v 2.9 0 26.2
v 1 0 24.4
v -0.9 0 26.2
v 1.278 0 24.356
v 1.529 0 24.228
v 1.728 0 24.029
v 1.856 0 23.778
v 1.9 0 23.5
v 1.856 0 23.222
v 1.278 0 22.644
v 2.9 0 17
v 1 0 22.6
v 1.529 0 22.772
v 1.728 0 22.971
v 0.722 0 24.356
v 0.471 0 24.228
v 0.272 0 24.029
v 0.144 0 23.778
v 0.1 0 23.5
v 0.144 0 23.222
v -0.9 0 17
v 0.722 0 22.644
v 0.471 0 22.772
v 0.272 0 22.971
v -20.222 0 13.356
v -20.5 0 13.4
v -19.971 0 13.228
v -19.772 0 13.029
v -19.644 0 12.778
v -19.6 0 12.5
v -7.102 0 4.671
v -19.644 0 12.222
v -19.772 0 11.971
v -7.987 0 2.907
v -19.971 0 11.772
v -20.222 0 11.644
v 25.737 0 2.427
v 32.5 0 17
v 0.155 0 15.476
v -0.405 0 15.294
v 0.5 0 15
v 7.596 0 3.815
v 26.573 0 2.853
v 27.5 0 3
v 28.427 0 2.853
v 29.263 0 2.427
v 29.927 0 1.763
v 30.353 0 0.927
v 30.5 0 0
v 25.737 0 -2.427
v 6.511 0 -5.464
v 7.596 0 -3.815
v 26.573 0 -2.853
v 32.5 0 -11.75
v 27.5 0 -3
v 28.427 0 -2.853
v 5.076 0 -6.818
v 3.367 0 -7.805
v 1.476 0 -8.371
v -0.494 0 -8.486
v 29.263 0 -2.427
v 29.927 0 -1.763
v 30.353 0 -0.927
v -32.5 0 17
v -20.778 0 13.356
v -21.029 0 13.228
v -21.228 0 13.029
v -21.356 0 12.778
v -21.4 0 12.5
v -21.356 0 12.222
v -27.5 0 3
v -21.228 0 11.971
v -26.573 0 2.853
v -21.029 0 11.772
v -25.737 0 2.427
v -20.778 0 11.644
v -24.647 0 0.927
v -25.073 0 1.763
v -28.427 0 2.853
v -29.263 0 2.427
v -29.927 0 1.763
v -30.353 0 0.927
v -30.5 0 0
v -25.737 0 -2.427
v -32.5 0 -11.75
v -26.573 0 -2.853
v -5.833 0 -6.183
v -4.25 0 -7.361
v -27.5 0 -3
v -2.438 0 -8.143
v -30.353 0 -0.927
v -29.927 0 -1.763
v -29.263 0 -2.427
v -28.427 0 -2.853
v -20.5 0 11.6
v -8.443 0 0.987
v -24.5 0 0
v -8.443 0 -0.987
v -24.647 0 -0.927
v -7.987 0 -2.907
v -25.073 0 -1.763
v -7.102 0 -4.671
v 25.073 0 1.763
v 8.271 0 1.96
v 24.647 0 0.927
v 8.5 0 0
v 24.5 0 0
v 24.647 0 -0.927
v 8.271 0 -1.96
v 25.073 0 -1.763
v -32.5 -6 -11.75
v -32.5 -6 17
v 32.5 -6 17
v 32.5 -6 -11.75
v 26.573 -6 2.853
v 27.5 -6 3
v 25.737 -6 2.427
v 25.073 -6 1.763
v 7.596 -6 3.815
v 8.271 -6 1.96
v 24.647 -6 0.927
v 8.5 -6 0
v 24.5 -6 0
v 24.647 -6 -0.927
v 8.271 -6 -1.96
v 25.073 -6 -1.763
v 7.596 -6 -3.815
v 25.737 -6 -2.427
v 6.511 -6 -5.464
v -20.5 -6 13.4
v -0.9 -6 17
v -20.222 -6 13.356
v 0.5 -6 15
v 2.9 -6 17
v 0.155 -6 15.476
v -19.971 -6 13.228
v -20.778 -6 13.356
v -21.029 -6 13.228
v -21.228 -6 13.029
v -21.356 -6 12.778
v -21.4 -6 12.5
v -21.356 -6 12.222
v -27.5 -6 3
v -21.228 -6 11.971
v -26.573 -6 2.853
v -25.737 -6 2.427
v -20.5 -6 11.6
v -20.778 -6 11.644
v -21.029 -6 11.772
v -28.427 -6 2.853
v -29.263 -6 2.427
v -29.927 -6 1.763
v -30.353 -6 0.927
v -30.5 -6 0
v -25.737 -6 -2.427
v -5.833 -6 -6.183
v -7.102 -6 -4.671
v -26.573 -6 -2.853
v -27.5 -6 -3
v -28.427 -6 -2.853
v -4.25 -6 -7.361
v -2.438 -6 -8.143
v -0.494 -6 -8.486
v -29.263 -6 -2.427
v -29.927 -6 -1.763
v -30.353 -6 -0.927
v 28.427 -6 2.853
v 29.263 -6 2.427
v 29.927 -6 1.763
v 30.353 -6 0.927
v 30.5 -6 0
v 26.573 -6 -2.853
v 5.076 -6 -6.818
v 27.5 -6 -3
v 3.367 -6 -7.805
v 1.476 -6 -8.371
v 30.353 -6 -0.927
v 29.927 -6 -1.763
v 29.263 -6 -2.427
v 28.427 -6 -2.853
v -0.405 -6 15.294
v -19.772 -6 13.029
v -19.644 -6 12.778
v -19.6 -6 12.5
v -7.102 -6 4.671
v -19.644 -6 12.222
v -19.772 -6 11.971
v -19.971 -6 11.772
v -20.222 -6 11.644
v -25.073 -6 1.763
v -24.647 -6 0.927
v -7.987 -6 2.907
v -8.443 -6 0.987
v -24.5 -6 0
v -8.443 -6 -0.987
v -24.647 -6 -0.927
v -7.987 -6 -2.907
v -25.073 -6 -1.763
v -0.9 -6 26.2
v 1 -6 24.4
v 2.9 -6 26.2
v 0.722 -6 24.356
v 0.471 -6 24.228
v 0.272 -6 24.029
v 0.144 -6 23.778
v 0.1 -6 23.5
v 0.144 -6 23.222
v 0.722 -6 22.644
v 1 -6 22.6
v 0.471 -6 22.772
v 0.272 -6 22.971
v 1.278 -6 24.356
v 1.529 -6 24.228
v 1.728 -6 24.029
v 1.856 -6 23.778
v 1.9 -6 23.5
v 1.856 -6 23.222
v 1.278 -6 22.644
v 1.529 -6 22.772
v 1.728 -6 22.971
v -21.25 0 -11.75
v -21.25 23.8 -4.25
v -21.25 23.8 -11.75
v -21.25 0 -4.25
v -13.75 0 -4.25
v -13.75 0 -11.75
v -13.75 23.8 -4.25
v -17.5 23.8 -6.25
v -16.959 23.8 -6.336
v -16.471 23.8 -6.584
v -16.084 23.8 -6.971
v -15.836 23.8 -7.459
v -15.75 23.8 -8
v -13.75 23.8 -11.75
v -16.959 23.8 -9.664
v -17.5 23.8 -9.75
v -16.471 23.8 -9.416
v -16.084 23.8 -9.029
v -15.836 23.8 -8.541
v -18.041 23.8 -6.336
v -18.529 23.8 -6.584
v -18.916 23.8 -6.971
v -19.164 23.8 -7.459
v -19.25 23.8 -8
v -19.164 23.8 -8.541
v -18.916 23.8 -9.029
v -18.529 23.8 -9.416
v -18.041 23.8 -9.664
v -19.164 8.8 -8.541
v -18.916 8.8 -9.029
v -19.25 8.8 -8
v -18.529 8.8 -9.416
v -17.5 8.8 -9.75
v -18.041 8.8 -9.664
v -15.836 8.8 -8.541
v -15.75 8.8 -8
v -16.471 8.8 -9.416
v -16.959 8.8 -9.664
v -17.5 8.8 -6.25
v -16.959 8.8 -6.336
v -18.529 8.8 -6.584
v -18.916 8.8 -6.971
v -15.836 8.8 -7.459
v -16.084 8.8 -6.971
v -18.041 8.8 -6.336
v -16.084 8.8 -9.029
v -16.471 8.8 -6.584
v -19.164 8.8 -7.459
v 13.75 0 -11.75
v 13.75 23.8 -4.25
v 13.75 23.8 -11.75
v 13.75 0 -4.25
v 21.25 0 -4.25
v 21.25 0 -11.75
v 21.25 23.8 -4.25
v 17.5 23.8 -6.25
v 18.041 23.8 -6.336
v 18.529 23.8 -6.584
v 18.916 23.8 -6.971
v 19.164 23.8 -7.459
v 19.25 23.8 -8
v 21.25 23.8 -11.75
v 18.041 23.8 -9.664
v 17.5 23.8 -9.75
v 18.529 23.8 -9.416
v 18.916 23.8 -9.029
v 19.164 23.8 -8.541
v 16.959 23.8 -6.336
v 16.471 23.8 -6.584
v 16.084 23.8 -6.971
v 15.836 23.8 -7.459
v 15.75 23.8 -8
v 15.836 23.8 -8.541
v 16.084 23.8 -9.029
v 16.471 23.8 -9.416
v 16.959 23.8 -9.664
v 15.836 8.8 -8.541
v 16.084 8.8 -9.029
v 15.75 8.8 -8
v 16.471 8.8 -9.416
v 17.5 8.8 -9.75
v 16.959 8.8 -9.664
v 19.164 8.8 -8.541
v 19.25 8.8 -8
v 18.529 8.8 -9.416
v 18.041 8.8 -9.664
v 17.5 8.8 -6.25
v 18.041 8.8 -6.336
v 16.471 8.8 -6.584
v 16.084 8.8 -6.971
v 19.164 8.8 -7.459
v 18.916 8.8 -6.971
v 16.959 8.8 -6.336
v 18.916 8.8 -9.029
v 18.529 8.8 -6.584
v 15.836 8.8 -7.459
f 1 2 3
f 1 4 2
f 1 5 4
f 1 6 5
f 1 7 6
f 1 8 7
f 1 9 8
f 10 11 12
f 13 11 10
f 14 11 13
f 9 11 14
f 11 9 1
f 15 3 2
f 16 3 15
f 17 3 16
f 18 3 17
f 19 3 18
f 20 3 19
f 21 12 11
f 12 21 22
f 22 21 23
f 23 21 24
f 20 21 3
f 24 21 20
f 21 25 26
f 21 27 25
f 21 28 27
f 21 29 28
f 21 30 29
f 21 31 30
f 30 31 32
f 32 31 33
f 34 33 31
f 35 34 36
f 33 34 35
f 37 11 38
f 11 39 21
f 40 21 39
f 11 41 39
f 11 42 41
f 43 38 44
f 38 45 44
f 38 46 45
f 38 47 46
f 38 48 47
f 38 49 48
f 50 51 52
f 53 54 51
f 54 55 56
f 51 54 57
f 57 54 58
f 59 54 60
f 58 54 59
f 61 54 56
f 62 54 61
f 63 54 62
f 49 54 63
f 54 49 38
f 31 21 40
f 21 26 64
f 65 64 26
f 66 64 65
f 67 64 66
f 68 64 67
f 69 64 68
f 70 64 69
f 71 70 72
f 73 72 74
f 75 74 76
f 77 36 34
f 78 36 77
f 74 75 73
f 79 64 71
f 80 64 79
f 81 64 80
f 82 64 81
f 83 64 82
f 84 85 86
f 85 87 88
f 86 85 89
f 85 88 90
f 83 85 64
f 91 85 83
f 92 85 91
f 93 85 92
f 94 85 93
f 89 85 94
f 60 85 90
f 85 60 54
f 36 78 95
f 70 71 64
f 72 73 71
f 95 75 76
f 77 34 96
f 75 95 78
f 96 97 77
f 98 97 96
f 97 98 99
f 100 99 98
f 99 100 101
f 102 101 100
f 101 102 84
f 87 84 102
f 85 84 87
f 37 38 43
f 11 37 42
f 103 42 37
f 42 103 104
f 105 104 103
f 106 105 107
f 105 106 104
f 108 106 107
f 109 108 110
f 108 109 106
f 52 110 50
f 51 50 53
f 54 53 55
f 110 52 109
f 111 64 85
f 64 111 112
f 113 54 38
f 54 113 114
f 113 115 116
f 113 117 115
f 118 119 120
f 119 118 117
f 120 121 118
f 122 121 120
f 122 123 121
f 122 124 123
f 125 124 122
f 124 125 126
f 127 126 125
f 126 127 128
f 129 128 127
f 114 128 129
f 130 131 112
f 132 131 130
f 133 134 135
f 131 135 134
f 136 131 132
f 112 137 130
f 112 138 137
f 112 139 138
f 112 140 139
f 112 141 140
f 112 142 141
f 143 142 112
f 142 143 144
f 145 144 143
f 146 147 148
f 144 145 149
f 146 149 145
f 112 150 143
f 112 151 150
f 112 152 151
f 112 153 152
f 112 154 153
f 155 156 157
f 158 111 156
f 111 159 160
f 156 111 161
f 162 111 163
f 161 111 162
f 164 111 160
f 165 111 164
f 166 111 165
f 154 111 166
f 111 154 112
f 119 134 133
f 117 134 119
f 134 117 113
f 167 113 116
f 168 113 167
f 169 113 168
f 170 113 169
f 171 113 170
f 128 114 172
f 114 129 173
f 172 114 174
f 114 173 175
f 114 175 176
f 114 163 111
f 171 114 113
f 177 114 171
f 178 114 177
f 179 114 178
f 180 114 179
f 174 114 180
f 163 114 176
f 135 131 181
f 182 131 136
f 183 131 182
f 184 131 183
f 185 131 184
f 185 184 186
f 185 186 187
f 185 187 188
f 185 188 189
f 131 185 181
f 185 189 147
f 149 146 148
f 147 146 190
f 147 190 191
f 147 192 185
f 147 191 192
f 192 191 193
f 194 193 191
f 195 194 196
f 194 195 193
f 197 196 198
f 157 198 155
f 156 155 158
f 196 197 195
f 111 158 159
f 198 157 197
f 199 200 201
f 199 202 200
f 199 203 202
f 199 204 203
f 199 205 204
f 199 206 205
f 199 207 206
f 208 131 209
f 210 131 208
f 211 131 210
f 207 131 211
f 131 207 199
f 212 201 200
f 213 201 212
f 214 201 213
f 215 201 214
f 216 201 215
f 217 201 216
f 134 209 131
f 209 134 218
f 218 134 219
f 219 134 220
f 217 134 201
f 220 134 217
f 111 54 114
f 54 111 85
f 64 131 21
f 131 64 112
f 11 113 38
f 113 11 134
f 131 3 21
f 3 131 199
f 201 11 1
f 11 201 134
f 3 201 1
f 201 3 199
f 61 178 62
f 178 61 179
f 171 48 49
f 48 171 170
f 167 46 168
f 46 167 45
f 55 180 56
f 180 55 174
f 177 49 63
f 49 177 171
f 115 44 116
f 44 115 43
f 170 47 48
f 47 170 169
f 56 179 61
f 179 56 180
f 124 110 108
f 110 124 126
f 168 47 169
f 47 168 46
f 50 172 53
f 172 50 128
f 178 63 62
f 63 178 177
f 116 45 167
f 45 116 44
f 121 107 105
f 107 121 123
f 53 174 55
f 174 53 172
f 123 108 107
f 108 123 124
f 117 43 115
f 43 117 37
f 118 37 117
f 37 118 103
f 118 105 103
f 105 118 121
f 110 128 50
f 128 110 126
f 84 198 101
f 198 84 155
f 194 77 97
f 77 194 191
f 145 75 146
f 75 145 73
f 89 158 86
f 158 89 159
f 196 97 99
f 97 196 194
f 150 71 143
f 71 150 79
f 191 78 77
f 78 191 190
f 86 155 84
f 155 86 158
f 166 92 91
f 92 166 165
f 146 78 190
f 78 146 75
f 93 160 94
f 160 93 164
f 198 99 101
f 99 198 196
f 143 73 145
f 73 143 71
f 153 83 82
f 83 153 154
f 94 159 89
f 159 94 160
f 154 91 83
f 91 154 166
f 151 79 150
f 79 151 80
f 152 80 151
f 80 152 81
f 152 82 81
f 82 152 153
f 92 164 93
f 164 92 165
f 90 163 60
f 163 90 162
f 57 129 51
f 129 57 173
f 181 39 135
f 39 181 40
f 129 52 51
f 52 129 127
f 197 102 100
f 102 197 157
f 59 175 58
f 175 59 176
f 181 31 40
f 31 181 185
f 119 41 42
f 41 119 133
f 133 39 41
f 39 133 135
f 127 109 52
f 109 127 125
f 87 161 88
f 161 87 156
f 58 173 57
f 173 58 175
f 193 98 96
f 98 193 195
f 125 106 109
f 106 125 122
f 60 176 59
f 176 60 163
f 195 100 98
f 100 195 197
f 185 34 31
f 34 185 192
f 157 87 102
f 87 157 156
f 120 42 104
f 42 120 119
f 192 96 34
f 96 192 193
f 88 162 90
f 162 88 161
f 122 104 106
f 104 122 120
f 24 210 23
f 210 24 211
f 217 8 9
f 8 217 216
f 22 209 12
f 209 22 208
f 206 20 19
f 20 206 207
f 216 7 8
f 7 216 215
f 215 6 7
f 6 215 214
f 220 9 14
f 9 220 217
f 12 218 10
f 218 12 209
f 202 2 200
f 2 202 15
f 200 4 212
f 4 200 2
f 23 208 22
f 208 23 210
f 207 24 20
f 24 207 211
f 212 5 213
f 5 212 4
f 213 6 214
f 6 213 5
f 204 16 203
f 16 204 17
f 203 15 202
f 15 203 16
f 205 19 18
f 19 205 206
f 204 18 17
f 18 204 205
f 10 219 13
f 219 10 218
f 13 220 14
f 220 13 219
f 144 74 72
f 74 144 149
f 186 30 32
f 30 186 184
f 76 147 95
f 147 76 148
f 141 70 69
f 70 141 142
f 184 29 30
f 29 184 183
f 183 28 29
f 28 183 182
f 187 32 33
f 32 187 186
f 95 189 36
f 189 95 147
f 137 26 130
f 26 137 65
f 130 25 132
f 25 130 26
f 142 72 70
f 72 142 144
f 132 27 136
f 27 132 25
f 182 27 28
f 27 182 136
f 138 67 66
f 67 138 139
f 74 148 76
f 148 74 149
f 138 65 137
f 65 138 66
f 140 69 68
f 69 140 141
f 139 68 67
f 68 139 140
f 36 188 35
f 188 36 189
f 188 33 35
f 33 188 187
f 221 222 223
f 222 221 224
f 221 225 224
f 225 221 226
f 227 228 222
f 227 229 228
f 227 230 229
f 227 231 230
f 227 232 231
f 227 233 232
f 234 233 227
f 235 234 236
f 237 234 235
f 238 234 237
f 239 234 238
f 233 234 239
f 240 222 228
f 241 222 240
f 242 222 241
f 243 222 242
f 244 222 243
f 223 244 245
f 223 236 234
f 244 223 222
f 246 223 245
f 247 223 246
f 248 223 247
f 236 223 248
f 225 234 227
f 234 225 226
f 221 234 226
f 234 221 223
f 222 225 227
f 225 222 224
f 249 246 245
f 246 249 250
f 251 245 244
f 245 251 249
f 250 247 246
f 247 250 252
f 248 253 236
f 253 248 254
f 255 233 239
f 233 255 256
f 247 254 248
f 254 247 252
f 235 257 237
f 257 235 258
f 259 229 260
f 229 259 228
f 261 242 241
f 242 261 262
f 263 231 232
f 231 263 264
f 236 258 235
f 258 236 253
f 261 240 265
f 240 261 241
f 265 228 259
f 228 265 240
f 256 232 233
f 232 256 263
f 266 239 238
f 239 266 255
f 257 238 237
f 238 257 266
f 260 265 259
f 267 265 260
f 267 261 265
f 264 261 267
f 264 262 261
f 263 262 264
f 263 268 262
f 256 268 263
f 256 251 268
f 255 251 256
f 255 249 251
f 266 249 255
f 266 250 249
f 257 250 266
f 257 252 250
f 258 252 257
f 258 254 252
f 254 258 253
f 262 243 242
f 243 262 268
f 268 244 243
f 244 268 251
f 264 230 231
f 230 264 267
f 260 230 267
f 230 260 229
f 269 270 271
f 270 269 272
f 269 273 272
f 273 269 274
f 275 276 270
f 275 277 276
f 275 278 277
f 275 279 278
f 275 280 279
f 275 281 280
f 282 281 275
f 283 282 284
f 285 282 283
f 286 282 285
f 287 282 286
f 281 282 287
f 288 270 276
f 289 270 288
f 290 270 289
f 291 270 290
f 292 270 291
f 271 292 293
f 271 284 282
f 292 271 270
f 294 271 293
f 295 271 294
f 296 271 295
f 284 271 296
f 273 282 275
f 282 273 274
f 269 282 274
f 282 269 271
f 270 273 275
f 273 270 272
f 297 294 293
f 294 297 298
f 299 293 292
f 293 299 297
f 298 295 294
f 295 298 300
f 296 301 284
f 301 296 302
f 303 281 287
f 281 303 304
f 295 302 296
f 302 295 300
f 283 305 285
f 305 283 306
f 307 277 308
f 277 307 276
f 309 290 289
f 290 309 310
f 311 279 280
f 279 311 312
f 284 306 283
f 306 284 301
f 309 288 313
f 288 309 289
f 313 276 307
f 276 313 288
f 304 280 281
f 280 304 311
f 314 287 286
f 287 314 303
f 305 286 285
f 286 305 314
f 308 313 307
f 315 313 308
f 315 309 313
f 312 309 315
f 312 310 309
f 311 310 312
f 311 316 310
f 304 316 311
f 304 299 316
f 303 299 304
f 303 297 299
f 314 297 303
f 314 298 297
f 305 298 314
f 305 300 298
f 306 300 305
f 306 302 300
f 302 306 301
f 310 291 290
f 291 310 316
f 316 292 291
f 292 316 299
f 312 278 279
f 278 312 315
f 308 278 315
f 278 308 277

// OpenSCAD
wall_thickness=2;
// Piece that will be rotated
damper_arm_diameter=9;
damper_arm_cut_width=5.1;
damper_arm_depth=12;
// stepper mount
stepper_shaft_diameter=5.8;
stepper_shaft_cut_width=3.5;
stepper_shaft_depth=7;
// Marker for closed position
marker_size=2;
marker_distance=9;
marker_height=5;
// Connecting the two
mount_length=1.2*(damper_arm_depth+stepper_shaft_depth);
mount_diameter=max(damper_arm_diameter,stepper_shaft_diameter)+wall_thickness*2;
// Pin offset degrees to achieve fully closed vent on button press
pin_degrees_offset=0;

/* 
 * motor-to-damper adaptor
**/
//translate([0, mount_diameter, -mount_length]) motor_to_damper_adaptor();

module motor_to_damper_adaptor() {
    rotate([0,0,pin_degrees_offset]) button_pin();
    difference() {
        // main body
        cylinder(mount_length, mount_diameter/2, mount_diameter/2);
        // Stepper cutout
        translate([0,0,stepper_shaft_depth/2]) mount_cutout(stepper_shaft_diameter/2, stepper_shaft_cut_width, stepper_shaft_depth);
        // Damper cutout
        translate([0,0,mount_length-damper_arm_depth/2]) mount_cutout(damper_arm_diameter/2, damper_arm_cut_width, damper_arm_depth);
    }
    
}

module button_pin() {
    translate([mount_diameter/2,0,mount_length-marker_distance]) scale([2*marker_size/marker_height, 0.6, 1]) sphere(d=marker_height, $fn=50);
    //translate([-mount_diameter/2,0,mount_length-marker_distance]) scale([2*marker_size/marker_height, 0.6, 1]) sphere(d=marker_height, $fn=50);
}

// Motor mount
vent_type="square"; // round or square
vent_diameter = 6*25.4; // 6"
shaft_offset=8;
motor_ears_distance=35;
motot_ears_hole_diameter=3.5;
motor_ears_screw_length=15;
vent_mount_distance=55;
vent_mount_hole_diameter=6;
motor_to_vent_distance=mount_length+4-wall_thickness*1.5; // 4mm distance between connector and motor body
vent_ears_total_length=vent_mount_distance+vent_mount_hole_diameter+wall_thickness*2;
vent_ears_total_width=mount_diameter+wall_thickness*4;
motor_screw_cube_side=motot_ears_hole_diameter+wall_thickness*2;
/*
 * mount bracket itself
**/
rotate([90,180,0]) motor_to_vent_mount();

// endstop sensor
endstop_screw_diameter=1.8;
endstop_screw1_distance=17;
endstop_screw1_offset=-1;
endstop_screw2_distance=6;
endstop_screw2_offset=20.5;

// Control board
board_width=23.5;
board_length=37.5;
board_latch_height=3.5;
holder_offset=3;

// Not a good idea after all
//translate([motor_ears_distance/2+motor_screw_cube_side/2,shaft_offset+motor_screw_cube_side/2,wall_thickness]) rotate([90,90,0]) controller_mount();

module controller_mount() {
    difference(){
        cube([board_width+wall_thickness*2, board_length+wall_thickness*2, board_latch_height+wall_thickness]);
        translate([wall_thickness, wall_thickness, wall_thickness]) cube([board_width, board_length, board_latch_height]);
        // Cutout for holder to be more flexible
        translate([holder_offset,0,wall_thickness]) cube([wall_thickness,board_length+wall_thickness*2, board_latch_height]);
        translate([holder_offset+wall_thickness*2,0,wall_thickness]) cube([wall_thickness,board_length+wall_thickness*2, board_latch_height]);
        translate([board_width-holder_offset+wall_thickness,0,wall_thickness]) cube([wall_thickness,board_length+wall_thickness*2, board_latch_height]);
        translate([board_width-holder_offset-wall_thickness,0,wall_thickness]) cube([wall_thickness,board_length+wall_thickness*2, board_latch_height]);
    }
    // board holder
    //translate([wall_thickness+holder_offset,wall_thickness,board_latch_height+wall_thickness]) rotate([0,0,270]) board_holder();
    //translate([board_width-holder_offset,wall_thickness,board_latch_height+wall_thickness]) rotate([0,0,270]) board_holder();
    //translate([2*wall_thickness+holder_offset,board_length+wall_thickness,board_latch_height+wall_thickness]) rotate([0,0,90]) board_holder();
    //translate([wall_thickness+board_width-holder_offset,board_length+wall_thickness,board_latch_height+wall_thickness]) rotate([0,0,90]) board_holder();
}

module board_holder() {
    union() {
        cube(wall_thickness, wall_thickness, wall_thickness);
        translate([0,wall_thickness, wall_thickness/2])rotate([90,0,0]) cylinder(d=wall_thickness, h=wall_thickness, $fn=20);
    }
}


module motor_to_vent_mount() {
    union() {
        // Vent ears
        vent_mount_plate();
        // motor mount
        translate([motor_ears_distance/2,shaft_offset,-motor_to_vent_distance]) motor_screw_connector();
        translate([-motor_ears_distance/2,shaft_offset,-motor_to_vent_distance]) motor_screw_connector();
    }
}

module damper_mount_cutout() {
    intersection() {
        cylinder(damper_arm_depth, damper_arm_diameter, damper_arm_diameter, center=true, $fn=40);
        cube([damper_arm_diameter*2, damper_arm_cut_width, damper_arm_depth], center=true);
    }
}

module mount_cutout(radius, width, depth) {
    intersection() {
        cylinder(depth, radius, radius, center=true, $fn=40);
        cube([radius*2, width, depth], center=true);
    }
}

module vent(length) {
    if (vent_type=="round") {
        cylinder(length, vent_diameter/2, vent_diameter/2, $fn=100);
    } else if (vent_type=="square") {
    } else {
        // How do you make it visible?
        echo("Unknown vent type");
    }
}

module vent_mount_plate() {
    endstop_sensor_space=max(endstop_screw1_distance,endstop_screw2_distance)+endstop_screw_diameter/2+wall_thickness-(vent_ears_total_width/2-mount_diameter/2);
    //                   ^ distance to furthest hole                          ^ mounting holes w/ walls                ^ distance from original edge to shaft
    plate_total_width=vent_ears_total_width+motor_screw_cube_side/2+shaft_offset-vent_ears_total_width/2+mount_diameter/2;
    //                 ^ base width         ^ extend for motor mount                                     ^ accommodate endstop sensor
    translate([-vent_ears_total_length/2,0,0]) rotate([0,90,0]) translate([-wall_thickness*1.5,0,0]) intersection() {
        difference() {
            union() {
                // General mount plate, then posts for endstop
                translate([-wall_thickness*1.5, -vent_ears_total_width/2-mount_diameter/2, 0]) cube([wall_thickness*3, plate_total_width, vent_ears_total_length]);
                // distance calculation for endstops
                height1 = endstop_screw1_distance;
                width=endstop_screw_diameter+wall_thickness;
                translate([-wall_thickness*1.5,-mount_diameter/2-height1-endstop_screw_diameter*1.5,endstop_screw1_offset+vent_ears_total_length/2-width/2]) 
                    cube([wall_thickness*3,height1,width]);
                height2 = endstop_screw2_distance;
                translate([-wall_thickness*1.5,-mount_diameter/2-height2-endstop_screw_diameter*1.5,endstop_screw2_offset+vent_ears_total_length/2-width/2]) 
                    cube([wall_thickness*3,height2,width]);
            }
            translate([-vent_diameter/2, 0, 0]) vent(vent_ears_total_length);
            // Mount holes cutout
            translate([-wall_thickness*1.5,0,vent_mount_hole_diameter/2+wall_thickness]) rotate([0,90,0]) cylinder(wall_thickness*3, vent_mount_hole_diameter/2, vent_mount_hole_diameter/2, $fn=20);
            translate([-wall_thickness*1.5,0,vent_ears_total_length-vent_mount_hole_diameter/2-wall_thickness]) rotate([0,90,0]) cylinder(wall_thickness*3, vent_mount_hole_diameter/2, vent_mount_hole_diameter/2, $fn=20);
            // shaft cutout
            #translate([-wall_thickness*1.8,0,vent_ears_total_length/2]) rotate([0,90,0]) shaft_cutout();
            // endstop sensor mount
            #translate([-5,-endstop_screw1_distance-mount_diameter/2,vent_ears_total_length/2+endstop_screw1_offset]) rotate([0,90,0]) cylinder(10, d=endstop_screw_diameter, $fn=20);
            #translate([-5,-endstop_screw2_distance-mount_diameter/2,vent_ears_total_length/2+endstop_screw2_offset]) rotate([0,90,0]) cylinder(10, d=endstop_screw_diameter, $fn=20);
        }
    }
}

module shaft_cutout() {
    hull() {
        cylinder(wall_thickness*4, mount_diameter/2+wall_thickness, mount_diameter/2+wall_thickness);
        // To make it easier to 3d print (less drastic overhang)
        translate([0,-mount_diameter-wall_thickness,0]) cylinder(d=1, h=wall_thickness*4);
    }
}

module motor_screw_connector() {
    difference() {
        translate([-motor_screw_cube_side/2, -motor_screw_cube_side/2, 0]) cube([motor_screw_cube_side, motor_screw_cube_side, motor_to_vent_distance]);
        cylinder(motor_ears_screw_length, motot_ears_hole_diameter/2, motot_ears_hole_diameter/2, $fn=20);
    }

}
